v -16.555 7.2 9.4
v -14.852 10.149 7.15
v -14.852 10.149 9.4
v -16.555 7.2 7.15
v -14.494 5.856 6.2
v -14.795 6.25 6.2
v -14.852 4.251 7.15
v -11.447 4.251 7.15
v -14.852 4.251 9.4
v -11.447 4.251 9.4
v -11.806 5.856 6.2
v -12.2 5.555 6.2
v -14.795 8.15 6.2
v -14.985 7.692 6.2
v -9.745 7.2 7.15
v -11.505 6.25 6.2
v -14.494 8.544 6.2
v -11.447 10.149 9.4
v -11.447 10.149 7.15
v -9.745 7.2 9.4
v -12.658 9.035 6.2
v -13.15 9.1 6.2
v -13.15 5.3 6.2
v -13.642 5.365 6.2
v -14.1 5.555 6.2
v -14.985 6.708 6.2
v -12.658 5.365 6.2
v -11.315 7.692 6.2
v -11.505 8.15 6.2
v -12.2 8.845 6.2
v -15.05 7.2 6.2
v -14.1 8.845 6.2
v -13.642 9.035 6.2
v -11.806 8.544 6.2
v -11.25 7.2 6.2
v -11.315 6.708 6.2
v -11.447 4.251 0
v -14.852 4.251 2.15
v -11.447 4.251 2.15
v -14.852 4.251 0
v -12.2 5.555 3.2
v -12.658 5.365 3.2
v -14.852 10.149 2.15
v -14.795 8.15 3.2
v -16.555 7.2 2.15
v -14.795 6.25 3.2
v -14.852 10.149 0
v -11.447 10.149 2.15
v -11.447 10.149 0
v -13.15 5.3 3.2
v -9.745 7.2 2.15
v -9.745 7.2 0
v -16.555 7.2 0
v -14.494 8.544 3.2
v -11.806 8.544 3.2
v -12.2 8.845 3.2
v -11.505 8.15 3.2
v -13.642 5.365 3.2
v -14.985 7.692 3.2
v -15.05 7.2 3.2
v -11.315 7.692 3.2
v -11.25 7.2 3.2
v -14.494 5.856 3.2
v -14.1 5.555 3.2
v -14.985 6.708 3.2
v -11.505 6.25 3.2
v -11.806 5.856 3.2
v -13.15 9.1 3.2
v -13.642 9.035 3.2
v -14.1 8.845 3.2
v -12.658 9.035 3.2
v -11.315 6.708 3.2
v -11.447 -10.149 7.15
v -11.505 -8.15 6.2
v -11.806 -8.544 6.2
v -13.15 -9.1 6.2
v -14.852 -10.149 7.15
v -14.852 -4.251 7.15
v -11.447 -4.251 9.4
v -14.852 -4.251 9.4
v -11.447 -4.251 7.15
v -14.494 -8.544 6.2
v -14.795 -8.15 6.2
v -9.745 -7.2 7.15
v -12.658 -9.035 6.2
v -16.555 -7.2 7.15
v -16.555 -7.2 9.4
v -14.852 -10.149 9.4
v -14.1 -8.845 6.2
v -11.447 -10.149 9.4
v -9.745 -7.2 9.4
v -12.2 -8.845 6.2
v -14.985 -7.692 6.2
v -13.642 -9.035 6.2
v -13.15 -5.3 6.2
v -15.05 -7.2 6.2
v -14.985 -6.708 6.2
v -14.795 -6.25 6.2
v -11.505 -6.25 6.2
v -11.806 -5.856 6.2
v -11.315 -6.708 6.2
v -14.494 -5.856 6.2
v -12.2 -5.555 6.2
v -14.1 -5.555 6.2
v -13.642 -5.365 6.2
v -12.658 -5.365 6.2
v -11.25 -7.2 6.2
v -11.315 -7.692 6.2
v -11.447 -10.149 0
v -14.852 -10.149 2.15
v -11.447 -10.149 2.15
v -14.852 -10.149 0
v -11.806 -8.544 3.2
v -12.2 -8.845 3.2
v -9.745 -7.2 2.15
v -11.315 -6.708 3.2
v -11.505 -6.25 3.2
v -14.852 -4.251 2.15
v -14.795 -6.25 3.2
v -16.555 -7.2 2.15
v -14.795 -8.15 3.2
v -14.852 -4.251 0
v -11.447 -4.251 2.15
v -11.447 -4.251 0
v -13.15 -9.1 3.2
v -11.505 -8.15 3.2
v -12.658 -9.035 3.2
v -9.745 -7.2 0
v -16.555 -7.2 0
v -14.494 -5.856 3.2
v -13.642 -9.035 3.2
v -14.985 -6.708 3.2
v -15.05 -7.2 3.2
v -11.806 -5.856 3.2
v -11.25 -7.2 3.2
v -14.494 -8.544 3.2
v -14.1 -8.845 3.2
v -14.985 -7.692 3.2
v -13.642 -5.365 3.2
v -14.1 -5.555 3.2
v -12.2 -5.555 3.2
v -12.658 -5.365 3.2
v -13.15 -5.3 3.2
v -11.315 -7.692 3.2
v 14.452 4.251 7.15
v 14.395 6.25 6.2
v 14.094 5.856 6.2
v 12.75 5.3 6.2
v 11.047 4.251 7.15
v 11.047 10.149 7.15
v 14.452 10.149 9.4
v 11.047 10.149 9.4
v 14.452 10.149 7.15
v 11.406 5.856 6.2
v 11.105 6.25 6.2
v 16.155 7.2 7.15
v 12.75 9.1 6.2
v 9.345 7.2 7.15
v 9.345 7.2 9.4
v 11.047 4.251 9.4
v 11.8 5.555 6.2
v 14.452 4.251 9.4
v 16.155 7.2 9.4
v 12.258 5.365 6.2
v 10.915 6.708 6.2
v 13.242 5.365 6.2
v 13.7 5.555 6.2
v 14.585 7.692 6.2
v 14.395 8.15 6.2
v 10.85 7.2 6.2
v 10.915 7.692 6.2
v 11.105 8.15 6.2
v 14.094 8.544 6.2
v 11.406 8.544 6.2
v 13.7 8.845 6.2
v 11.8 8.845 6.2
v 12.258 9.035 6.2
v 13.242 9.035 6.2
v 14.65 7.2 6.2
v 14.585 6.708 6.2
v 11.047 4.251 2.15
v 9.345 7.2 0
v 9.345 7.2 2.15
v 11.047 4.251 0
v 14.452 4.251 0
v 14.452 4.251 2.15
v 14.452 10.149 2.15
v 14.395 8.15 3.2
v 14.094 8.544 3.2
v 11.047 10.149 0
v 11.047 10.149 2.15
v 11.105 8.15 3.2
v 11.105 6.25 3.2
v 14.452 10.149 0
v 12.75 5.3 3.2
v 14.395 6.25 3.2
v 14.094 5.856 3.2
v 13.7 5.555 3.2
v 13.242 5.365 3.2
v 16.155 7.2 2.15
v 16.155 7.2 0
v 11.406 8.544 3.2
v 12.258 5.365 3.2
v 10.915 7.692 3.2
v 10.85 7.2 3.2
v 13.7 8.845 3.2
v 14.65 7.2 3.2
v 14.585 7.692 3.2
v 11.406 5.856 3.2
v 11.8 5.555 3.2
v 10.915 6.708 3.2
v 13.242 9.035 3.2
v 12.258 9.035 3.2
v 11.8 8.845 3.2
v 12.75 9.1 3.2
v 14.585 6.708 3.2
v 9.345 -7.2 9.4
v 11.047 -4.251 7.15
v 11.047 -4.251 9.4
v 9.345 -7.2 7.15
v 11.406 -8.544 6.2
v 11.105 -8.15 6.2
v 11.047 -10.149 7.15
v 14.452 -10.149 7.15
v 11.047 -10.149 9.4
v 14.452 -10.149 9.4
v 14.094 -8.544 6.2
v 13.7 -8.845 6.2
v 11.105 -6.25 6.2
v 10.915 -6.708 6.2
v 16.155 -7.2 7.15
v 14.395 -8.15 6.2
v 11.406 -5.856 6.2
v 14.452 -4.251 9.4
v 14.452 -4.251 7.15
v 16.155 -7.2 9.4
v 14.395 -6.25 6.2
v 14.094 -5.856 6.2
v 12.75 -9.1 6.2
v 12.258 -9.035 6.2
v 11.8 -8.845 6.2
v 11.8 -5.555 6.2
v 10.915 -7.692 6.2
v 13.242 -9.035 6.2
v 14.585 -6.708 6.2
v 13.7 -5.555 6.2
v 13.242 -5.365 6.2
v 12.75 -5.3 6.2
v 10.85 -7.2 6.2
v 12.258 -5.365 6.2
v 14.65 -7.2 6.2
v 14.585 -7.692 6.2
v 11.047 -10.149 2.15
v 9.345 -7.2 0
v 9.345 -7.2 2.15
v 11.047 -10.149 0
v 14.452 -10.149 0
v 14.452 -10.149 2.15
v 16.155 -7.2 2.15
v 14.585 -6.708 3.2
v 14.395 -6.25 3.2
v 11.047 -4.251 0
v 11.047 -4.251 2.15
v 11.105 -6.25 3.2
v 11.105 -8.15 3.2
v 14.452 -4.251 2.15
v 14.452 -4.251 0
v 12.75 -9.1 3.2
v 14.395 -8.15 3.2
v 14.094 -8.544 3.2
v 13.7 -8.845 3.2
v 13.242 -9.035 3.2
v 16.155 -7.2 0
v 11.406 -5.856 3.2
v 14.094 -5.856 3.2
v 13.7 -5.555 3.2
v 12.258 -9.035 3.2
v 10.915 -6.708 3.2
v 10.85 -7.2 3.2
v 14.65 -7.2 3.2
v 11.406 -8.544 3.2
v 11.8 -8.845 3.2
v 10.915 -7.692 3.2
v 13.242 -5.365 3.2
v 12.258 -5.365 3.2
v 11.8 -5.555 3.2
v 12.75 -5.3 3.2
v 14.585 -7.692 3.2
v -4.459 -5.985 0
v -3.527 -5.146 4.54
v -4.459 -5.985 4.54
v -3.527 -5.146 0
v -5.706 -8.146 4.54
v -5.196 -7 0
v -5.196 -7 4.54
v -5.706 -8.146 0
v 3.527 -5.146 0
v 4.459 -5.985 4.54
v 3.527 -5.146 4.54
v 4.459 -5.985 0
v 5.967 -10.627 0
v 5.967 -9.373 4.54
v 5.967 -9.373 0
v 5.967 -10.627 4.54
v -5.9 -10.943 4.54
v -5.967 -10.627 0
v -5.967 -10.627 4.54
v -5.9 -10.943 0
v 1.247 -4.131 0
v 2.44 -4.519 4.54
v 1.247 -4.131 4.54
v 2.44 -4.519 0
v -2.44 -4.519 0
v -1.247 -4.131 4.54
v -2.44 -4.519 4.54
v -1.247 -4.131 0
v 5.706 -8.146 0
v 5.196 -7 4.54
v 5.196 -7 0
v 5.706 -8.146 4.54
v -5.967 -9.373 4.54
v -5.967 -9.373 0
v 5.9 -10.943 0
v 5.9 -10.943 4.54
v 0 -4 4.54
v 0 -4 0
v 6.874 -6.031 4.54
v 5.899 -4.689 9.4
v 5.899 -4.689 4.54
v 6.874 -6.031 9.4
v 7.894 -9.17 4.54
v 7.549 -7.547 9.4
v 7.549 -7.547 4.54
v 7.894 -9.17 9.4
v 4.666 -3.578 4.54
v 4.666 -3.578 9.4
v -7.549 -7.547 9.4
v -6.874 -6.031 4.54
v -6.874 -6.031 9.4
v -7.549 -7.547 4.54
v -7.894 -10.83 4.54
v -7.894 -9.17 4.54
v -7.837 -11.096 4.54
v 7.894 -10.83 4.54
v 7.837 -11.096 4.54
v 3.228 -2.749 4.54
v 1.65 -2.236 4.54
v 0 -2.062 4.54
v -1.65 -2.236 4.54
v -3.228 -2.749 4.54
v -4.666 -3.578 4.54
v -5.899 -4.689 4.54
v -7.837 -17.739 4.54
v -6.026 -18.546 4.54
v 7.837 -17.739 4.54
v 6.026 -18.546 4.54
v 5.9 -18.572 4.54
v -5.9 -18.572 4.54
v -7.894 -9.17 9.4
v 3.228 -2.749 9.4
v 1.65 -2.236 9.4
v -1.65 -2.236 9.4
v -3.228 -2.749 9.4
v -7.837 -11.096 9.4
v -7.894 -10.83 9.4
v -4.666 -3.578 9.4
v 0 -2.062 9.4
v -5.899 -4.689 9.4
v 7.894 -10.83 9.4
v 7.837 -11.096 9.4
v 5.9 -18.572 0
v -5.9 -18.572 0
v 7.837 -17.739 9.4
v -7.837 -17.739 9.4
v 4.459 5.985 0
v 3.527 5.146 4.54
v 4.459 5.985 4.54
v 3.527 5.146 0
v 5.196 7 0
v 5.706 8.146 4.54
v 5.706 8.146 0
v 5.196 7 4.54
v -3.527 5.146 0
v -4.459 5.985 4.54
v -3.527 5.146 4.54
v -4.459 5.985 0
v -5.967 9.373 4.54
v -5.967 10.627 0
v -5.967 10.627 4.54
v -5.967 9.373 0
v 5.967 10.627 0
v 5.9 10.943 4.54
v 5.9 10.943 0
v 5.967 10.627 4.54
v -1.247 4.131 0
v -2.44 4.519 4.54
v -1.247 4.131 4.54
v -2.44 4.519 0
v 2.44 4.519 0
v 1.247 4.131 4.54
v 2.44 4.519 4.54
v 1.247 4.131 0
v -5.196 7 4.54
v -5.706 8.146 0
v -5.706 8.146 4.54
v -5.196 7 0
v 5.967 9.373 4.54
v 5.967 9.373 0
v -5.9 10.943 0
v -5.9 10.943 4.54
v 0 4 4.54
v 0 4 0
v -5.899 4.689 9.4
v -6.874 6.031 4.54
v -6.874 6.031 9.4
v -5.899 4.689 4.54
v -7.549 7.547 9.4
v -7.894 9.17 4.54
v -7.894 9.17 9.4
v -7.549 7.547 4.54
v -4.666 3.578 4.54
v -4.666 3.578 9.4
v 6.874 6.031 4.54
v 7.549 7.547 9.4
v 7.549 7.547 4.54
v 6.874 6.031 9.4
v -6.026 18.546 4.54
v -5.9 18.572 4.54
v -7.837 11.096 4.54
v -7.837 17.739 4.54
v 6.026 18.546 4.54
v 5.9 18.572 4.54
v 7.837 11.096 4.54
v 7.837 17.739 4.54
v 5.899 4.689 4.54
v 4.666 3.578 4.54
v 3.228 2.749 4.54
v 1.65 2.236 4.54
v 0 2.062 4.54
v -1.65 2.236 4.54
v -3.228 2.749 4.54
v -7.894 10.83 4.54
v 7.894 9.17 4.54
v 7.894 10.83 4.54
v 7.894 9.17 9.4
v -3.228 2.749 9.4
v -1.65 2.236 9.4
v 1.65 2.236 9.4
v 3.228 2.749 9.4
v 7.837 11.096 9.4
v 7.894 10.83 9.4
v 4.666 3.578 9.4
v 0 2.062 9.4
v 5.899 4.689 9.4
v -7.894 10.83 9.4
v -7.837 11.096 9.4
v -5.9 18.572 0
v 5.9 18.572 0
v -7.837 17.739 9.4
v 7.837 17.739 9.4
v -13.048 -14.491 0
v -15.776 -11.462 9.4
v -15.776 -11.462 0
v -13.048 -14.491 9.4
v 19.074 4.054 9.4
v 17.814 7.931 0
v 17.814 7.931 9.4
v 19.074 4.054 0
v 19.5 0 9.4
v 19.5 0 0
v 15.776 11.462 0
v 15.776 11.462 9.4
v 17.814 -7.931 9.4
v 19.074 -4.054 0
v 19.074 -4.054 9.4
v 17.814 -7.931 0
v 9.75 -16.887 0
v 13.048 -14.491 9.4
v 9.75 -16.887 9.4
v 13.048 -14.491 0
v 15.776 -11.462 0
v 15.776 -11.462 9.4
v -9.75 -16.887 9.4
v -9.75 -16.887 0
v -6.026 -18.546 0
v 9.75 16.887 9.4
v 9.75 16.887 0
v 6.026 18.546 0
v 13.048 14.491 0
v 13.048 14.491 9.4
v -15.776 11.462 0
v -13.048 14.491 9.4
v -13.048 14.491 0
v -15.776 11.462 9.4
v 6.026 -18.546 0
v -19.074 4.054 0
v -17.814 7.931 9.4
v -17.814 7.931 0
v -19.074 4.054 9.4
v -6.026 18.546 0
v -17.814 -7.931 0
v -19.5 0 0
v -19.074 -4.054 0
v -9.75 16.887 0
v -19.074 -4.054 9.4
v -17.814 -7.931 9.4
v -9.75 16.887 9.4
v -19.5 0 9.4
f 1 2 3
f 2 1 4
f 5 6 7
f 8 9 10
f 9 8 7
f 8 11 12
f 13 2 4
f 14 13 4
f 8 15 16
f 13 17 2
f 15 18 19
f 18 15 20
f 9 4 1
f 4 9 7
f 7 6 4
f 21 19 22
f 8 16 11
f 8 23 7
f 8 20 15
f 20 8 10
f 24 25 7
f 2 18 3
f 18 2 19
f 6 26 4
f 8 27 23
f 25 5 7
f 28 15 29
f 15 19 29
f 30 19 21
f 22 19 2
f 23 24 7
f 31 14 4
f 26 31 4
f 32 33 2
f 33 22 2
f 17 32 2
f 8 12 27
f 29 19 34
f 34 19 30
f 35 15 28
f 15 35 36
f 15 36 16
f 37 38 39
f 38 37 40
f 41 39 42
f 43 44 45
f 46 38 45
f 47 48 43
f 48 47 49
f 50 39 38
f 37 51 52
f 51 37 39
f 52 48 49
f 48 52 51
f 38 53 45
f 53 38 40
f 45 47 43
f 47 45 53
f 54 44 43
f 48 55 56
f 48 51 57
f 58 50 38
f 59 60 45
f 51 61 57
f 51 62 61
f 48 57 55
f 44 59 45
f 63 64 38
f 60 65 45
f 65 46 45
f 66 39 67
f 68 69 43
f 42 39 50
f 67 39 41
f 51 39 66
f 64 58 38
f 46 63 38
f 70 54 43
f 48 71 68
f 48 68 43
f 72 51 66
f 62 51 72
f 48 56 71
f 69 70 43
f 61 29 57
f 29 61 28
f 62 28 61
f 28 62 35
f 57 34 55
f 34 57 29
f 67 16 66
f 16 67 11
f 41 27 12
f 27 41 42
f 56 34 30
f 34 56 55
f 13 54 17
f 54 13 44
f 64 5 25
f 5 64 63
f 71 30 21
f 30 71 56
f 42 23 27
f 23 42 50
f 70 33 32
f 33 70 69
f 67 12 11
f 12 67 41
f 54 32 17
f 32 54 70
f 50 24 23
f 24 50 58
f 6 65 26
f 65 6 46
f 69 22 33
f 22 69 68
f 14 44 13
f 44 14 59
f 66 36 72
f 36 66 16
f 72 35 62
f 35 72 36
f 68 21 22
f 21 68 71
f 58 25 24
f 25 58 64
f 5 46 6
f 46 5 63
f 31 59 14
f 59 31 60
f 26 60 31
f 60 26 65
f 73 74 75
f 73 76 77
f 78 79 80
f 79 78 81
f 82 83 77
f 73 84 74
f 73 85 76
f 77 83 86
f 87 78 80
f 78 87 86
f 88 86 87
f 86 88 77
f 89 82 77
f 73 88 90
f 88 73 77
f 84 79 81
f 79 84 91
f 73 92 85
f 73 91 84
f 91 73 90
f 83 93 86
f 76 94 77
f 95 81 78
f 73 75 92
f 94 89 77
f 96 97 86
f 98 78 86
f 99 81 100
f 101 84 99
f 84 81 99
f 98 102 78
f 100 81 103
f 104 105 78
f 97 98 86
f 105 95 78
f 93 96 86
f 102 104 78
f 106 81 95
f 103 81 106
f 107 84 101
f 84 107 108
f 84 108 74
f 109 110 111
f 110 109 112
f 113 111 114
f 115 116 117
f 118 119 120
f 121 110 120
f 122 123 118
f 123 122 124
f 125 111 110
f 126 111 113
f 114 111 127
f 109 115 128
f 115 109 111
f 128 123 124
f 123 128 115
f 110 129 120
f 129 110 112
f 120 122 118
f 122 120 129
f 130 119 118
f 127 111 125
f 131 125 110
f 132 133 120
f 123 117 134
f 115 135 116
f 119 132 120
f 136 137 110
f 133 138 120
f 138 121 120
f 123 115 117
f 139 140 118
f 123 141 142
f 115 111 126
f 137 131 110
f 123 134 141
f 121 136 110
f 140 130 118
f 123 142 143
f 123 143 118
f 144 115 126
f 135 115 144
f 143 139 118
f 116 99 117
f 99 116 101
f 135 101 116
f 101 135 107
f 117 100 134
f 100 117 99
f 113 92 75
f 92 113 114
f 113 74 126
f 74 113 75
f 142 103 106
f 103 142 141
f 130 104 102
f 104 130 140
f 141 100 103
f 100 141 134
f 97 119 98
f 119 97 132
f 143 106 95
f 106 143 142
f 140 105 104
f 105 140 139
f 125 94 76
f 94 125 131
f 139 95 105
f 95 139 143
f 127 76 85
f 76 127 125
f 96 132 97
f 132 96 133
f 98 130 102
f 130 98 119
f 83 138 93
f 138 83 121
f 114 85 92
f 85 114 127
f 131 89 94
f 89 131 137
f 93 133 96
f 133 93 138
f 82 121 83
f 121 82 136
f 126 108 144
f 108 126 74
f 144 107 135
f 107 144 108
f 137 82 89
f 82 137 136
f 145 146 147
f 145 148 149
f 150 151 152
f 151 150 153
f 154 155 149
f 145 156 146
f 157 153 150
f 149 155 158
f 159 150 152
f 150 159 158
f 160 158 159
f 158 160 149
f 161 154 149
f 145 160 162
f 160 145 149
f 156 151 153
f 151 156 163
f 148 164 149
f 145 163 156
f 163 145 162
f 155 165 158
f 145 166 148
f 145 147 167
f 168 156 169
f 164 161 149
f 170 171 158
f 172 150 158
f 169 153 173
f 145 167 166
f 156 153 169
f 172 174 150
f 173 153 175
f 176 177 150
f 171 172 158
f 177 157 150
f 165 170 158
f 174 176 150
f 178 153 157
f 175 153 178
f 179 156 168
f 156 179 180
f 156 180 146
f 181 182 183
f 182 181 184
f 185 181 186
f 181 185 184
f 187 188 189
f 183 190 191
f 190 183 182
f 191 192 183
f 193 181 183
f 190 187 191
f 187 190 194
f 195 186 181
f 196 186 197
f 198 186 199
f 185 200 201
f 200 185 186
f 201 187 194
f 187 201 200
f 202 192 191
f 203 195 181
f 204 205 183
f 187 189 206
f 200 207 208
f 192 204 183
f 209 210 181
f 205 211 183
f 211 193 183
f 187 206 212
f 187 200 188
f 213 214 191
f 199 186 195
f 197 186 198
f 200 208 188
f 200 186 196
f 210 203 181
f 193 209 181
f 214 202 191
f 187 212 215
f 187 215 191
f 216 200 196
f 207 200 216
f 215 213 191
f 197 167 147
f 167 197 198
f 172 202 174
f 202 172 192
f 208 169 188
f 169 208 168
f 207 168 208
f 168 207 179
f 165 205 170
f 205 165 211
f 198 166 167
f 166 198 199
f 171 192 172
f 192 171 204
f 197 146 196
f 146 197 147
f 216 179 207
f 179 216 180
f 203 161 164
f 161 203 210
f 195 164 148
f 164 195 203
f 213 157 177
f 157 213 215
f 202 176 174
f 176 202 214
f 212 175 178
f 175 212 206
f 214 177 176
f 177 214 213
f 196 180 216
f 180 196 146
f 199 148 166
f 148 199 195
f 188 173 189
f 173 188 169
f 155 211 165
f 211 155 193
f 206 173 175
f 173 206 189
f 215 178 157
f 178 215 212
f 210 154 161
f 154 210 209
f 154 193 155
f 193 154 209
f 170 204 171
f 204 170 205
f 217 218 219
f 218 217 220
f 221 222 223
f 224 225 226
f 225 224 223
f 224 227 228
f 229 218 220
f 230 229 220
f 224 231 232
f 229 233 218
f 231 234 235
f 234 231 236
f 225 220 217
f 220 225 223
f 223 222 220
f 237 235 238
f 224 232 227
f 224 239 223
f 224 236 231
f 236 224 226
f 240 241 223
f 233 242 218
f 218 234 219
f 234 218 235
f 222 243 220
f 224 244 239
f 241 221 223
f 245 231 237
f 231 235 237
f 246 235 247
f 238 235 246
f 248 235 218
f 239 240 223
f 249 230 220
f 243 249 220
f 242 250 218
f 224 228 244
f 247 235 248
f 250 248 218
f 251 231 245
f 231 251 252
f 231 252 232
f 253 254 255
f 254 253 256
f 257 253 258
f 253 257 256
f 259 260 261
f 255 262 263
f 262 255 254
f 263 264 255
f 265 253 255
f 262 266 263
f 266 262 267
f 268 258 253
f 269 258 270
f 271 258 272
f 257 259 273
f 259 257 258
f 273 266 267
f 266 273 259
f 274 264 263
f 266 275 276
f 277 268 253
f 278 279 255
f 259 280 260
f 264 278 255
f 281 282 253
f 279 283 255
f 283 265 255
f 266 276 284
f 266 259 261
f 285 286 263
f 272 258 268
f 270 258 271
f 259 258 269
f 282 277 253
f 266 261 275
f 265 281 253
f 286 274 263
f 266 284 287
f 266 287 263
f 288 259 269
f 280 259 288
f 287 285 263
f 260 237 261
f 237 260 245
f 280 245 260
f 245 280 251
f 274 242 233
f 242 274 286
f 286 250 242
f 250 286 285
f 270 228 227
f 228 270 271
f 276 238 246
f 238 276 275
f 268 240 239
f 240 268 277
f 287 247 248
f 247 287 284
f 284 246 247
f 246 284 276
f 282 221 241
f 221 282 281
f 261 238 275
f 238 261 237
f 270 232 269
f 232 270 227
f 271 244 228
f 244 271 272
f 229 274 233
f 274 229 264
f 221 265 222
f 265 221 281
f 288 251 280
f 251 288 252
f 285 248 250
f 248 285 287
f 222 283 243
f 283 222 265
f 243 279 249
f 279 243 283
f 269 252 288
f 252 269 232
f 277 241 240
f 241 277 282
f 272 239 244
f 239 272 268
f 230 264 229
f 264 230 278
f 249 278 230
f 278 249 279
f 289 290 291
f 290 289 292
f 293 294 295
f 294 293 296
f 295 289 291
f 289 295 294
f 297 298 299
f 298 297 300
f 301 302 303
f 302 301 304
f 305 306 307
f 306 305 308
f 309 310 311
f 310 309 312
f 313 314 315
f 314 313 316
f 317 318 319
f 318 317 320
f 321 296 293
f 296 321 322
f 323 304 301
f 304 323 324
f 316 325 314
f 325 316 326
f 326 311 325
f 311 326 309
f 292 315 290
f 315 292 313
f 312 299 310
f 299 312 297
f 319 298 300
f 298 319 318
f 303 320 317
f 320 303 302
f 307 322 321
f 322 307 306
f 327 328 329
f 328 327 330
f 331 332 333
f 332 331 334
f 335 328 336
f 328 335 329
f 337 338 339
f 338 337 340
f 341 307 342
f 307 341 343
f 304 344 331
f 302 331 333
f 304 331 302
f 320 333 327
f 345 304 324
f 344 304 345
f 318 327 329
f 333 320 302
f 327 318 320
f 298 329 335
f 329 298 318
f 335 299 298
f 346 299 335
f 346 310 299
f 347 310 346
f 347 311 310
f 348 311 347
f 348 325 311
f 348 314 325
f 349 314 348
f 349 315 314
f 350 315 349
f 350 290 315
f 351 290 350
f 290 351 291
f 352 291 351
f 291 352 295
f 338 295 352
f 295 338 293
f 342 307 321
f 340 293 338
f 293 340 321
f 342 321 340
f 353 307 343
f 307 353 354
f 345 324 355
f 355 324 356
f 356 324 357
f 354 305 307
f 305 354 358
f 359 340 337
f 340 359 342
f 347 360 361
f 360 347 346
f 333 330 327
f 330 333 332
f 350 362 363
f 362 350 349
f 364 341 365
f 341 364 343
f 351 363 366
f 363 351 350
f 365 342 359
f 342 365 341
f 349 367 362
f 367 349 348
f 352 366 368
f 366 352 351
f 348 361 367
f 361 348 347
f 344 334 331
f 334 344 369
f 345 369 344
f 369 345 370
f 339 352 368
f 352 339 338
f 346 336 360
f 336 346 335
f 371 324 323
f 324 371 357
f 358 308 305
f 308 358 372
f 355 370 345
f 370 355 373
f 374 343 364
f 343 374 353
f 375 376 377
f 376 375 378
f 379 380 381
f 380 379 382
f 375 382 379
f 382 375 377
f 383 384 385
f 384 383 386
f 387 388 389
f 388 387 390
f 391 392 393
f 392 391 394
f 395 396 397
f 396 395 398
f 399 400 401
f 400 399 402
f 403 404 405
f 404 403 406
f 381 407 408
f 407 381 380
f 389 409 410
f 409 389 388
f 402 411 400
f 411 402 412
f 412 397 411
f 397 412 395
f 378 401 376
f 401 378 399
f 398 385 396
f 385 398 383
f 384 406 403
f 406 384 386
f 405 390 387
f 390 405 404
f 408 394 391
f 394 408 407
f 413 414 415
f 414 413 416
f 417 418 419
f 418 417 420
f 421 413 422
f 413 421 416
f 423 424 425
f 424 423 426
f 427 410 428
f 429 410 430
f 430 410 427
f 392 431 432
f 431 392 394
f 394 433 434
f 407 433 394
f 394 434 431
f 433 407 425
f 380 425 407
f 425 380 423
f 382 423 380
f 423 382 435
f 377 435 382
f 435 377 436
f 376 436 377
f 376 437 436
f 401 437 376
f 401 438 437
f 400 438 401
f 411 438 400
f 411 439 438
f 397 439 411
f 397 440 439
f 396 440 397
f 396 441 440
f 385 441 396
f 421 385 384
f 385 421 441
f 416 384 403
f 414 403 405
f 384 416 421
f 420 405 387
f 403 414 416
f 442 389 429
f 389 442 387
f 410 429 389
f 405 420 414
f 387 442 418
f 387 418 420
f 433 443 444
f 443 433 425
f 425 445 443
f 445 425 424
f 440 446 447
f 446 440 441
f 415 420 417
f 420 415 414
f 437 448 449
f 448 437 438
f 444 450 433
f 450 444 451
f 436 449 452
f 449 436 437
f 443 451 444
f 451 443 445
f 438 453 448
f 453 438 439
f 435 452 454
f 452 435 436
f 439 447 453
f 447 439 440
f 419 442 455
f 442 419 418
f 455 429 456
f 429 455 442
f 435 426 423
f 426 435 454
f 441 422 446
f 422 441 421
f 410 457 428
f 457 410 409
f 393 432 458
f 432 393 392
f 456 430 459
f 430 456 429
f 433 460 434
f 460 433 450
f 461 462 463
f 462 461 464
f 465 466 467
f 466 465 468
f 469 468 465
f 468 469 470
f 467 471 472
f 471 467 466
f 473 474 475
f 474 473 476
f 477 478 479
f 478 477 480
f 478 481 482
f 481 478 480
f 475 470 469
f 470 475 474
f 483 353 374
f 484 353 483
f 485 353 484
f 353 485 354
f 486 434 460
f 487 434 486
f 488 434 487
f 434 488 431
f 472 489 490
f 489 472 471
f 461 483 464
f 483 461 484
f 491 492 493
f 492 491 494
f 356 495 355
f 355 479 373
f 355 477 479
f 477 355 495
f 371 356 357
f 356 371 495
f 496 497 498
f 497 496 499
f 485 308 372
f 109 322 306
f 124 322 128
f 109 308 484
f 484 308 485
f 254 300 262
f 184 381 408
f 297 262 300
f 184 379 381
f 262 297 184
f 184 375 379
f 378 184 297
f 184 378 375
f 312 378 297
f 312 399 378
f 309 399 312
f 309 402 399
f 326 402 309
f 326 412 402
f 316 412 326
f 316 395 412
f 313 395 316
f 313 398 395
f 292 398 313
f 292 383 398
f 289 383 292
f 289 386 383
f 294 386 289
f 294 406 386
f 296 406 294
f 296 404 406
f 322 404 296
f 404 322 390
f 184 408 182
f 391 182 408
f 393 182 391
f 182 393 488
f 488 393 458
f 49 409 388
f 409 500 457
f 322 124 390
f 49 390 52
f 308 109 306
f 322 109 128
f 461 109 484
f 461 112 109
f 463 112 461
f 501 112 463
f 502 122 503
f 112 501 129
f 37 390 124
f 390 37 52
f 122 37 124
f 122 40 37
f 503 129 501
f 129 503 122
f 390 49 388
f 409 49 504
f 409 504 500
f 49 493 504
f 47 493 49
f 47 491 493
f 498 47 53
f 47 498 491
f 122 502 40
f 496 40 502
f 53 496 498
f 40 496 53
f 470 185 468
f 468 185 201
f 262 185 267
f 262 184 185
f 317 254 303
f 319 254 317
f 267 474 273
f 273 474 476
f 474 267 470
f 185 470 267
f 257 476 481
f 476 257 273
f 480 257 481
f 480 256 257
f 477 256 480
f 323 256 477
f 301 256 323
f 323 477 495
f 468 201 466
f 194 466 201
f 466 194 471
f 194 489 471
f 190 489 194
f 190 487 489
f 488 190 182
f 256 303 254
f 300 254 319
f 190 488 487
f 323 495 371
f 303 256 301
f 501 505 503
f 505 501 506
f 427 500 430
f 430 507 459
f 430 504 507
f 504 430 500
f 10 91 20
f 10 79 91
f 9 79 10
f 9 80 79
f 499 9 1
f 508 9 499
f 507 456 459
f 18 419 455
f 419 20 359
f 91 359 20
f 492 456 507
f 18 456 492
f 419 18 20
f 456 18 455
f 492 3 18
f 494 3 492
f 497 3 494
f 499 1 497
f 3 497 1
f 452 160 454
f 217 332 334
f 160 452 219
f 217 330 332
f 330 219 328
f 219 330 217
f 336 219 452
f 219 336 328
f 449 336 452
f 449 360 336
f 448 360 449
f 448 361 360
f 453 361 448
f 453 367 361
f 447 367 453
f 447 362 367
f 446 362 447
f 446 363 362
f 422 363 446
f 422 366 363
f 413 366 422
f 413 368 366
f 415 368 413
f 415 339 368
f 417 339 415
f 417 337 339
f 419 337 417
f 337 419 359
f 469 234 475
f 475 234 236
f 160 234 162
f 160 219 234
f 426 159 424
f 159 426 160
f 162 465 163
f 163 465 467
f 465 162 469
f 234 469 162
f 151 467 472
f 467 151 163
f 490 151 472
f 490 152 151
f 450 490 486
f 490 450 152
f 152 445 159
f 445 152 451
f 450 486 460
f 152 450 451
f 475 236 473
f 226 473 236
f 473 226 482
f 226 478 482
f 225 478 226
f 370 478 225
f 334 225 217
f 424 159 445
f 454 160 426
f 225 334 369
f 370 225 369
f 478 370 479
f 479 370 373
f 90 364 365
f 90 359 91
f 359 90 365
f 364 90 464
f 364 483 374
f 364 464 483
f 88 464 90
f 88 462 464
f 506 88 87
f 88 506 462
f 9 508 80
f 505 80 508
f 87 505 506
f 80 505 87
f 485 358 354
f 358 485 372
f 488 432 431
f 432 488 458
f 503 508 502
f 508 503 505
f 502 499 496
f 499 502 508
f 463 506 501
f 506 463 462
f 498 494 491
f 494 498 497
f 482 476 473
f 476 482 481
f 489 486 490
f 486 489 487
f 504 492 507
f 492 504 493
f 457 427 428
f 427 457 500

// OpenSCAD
$fs=0.5*1;
j_head_dia = 15.875*1;
j_head_upper_h = 4.76*1;
j_head_groove_dia = 12*1;
j_head_groove_h = 4.64*1;
insert_height=j_head_groove_h+j_head_upper_h;
dual_offset = 10*1;
extra = 0.1*1;
ns=1*1;

M3_clearance_radius = (3/2)+0.4;//(3.3/2);
M3_nut_radius = (6.01/2)+0.4;
M3_nut_trap_depth = 2.2*1;
M4_clearance_radius = (4/2)+0.4;//2.2;
holes = [
	[-13.15,7.2],
	[-13.15,-7.2],
	[12.75,7.2],
	[12.75,-7.2]
];

// Customizer Settings

// The configuration of the heads. Can be single or double.
Insert_Configuration = "Double"; //[Single,Double]

// The configuration of the plate. "All" will result in a plate that can be used with either the single or double insert. "Single" and "Double" will result in a plate specific to the insert.
Plate_Configuration = "All"; //[All,Single,Double]

// The tap drill diameter of the pneumatic fitting threads. Some common values: 1/8" NPT = 8.611 mm, 1/4" NPT = 11.113 mm, 1/8" BSP = 8.6, 1/4" BSP = 11.5.
Pneumatic_Fitting_Thread_Diameter = 8.6;

// The length of the threaded part of the pneumatic fitting.
Pneumatic_Fitting_Thread_Height = 7.0;

fitting_wall_th = 2*1; 
plate_chamfer = 1*1;

// The thickness of the plate.
Plate_Height = 3;

// The diameter of the plate. This should match the outer diameter of the Rostock platform; for the standard Rostock this should be 60.
Plate_Diameter = 60;

// The diameter of the insert. This should be just less than the inner diameter of the Rostock platform; for the standard Rostock the inner diameter is 40.
Insert_Diameter = 39;

// The bolt circle diameter for the 4 mm bolts ono the plate. This should match the bolt circle diameter of the Rostock Platform; for the standard Rostock this should be 50.
Plate_Bolt_Circle_Diameter = 50;

// What objects would you like to generate?
Resulting_Objects = "Insert";//[Both,Plate,Insert]



max_height=max(Plate_Height,Pneumatic_Fitting_Thread_Height,insert_height);

// Display
if(Resulting_Objects=="Both") {
translate([(Plate_Diameter/2)+2.5,0,0])	jhead_mount_plate();
translate([-(Insert_Diameter/2)-2.5,0,0]) jhead_mount_insert();
} else if(Resulting_Objects=="Plate") {
	jhead_mount_plate();
} else if(Resulting_Objects=="Insert") {
	jhead_mount_insert();
} else {
	echo("This shouldn't happen.");
}

module jhead_mount_plate() {
  difference() {
		// Base plate.
		union() {
		hull() {
			cylinder(r=(Plate_Diameter/2),h=Plate_Height-plate_chamfer);
			translate([0,0,Plate_Height-plate_chamfer]) cylinder(r=(Plate_Diameter/2)-plate_chamfer,h=plate_chamfer);
		}
	hull() {
		if(Plate_Configuration!="Double") {
		translate([0,0,0]) cylinder(r=(Pneumatic_Fitting_Thread_Diameter/2)+fitting_wall_th,h=Pneumatic_Fitting_Thread_Height);
		}
	if(Plate_Configuration!="Single") {
		translate([0,-dual_offset,0]) cylinder(r=(Pneumatic_Fitting_Thread_Diameter/2)+fitting_wall_th,h=Pneumatic_Fitting_Thread_Height);
		translate([0,dual_offset,0]) cylinder(r=(Pneumatic_Fitting_Thread_Diameter/2)+fitting_wall_th,h=Pneumatic_Fitting_Thread_Height);
		}
	}	
}

		// 6 x 4mm holes for mounting to platform.
		for(i=[0:60:360]) {
			rotate([0,0,i]) translate([(Plate_Bolt_Circle_Diameter/2),0,-extra]) cylinder(r=M4_clearance_radius,h=max_height+(2*extra));
		}

		// 3 x 5mm holes for pneumatic fitting(s).
		if(Plate_Configuration!="Double") {
		translate([0,0,-extra]) cylinder(r=(Pneumatic_Fitting_Thread_Diameter/2),h=max_height+(2*extra));
}
	if(Plate_Configuration!="Single") {
		translate([0,-dual_offset,-extra]) cylinder(r=(Pneumatic_Fitting_Thread_Diameter/2),h=max_height+(2*extra));
		translate([0,dual_offset,-extra]) cylinder(r=(Pneumatic_Fitting_Thread_Diameter/2),h=max_height+(2*extra));
}

		// 3mm holes for mounting J_insert.
		for (i=holes) {
			translate([i[0],i[1],-extra]) cylinder(h=max_height+(2*extra),r=M3_clearance_radius,center=true);
		}
  }

}

module jhead_mount_insert() {
	difference() {
		// Base insert.
		cylinder(h=insert_height,r=(Insert_Diameter/2));

		// 3mm holes for mounting to J_Ring.
		for (i=holes) {
			// 3mm hole through insert.
			

			// M3 nut on top of insert.
			hull() {
				translate([i[0],i[1],insert_height-M3_nut_trap_depth-(ns/2)]) cylinder(h=ns,r=M3_clearance_radius,center=true);
				translate([i[0],i[1],insert_height-(M3_nut_trap_depth/2)]) cylinder(h=M3_nut_trap_depth+extra,r=M3_nut_radius,center=true,$fn=6);
			}

			// M3 nut of bottom of insert.
			hull() {
				translate([i[0],i[1],M3_nut_trap_depth+(ns/2)]) cylinder(h=ns,r=M3_clearance_radius,center=true);
				translate([i[0],i[1],(M3_nut_trap_depth/2)-extra]) cylinder(h=M3_nut_trap_depth+extra,r=M3_nut_radius,center=true,$fn=6);
			}
			translate([i[0],i[1],-extra]) cylinder(h=max_height+(2*extra),r=M3_clearance_radius);
		}

		// Hole for J-Head.
		if(Insert_Configuration=="Double") {
			translate([0,-dual_offset,-0.1]) rotate([0,0,270]) jhead_hole();
			translate([0,dual_offset,-0.1]) rotate([0,0,90]) jhead_hole();
		} else {
			translate([0,0,-0.1]) rotate([0,0,270]) jhead_hole();
		}
	}
}

module jhead_hole() {
	translate([0,0,-extra]) cylinder(h=max_height+(2*extra),r=j_head_groove_dia/2,center=true);
	translate([0,0,j_head_groove_h]) cylinder(h=5,r=j_head_dia/2);
	translate([(Insert_Diameter/2)/2,0,-extra]) cube([(Insert_Diameter/2),j_head_groove_dia-0.2,max_height+(2*extra)],center=true);
	translate([(Insert_Diameter/2)/2,0,(5/2)+j_head_groove_h]) cube([(Insert_Diameter/2),j_head_dia-0.2,5],center=true);
}
